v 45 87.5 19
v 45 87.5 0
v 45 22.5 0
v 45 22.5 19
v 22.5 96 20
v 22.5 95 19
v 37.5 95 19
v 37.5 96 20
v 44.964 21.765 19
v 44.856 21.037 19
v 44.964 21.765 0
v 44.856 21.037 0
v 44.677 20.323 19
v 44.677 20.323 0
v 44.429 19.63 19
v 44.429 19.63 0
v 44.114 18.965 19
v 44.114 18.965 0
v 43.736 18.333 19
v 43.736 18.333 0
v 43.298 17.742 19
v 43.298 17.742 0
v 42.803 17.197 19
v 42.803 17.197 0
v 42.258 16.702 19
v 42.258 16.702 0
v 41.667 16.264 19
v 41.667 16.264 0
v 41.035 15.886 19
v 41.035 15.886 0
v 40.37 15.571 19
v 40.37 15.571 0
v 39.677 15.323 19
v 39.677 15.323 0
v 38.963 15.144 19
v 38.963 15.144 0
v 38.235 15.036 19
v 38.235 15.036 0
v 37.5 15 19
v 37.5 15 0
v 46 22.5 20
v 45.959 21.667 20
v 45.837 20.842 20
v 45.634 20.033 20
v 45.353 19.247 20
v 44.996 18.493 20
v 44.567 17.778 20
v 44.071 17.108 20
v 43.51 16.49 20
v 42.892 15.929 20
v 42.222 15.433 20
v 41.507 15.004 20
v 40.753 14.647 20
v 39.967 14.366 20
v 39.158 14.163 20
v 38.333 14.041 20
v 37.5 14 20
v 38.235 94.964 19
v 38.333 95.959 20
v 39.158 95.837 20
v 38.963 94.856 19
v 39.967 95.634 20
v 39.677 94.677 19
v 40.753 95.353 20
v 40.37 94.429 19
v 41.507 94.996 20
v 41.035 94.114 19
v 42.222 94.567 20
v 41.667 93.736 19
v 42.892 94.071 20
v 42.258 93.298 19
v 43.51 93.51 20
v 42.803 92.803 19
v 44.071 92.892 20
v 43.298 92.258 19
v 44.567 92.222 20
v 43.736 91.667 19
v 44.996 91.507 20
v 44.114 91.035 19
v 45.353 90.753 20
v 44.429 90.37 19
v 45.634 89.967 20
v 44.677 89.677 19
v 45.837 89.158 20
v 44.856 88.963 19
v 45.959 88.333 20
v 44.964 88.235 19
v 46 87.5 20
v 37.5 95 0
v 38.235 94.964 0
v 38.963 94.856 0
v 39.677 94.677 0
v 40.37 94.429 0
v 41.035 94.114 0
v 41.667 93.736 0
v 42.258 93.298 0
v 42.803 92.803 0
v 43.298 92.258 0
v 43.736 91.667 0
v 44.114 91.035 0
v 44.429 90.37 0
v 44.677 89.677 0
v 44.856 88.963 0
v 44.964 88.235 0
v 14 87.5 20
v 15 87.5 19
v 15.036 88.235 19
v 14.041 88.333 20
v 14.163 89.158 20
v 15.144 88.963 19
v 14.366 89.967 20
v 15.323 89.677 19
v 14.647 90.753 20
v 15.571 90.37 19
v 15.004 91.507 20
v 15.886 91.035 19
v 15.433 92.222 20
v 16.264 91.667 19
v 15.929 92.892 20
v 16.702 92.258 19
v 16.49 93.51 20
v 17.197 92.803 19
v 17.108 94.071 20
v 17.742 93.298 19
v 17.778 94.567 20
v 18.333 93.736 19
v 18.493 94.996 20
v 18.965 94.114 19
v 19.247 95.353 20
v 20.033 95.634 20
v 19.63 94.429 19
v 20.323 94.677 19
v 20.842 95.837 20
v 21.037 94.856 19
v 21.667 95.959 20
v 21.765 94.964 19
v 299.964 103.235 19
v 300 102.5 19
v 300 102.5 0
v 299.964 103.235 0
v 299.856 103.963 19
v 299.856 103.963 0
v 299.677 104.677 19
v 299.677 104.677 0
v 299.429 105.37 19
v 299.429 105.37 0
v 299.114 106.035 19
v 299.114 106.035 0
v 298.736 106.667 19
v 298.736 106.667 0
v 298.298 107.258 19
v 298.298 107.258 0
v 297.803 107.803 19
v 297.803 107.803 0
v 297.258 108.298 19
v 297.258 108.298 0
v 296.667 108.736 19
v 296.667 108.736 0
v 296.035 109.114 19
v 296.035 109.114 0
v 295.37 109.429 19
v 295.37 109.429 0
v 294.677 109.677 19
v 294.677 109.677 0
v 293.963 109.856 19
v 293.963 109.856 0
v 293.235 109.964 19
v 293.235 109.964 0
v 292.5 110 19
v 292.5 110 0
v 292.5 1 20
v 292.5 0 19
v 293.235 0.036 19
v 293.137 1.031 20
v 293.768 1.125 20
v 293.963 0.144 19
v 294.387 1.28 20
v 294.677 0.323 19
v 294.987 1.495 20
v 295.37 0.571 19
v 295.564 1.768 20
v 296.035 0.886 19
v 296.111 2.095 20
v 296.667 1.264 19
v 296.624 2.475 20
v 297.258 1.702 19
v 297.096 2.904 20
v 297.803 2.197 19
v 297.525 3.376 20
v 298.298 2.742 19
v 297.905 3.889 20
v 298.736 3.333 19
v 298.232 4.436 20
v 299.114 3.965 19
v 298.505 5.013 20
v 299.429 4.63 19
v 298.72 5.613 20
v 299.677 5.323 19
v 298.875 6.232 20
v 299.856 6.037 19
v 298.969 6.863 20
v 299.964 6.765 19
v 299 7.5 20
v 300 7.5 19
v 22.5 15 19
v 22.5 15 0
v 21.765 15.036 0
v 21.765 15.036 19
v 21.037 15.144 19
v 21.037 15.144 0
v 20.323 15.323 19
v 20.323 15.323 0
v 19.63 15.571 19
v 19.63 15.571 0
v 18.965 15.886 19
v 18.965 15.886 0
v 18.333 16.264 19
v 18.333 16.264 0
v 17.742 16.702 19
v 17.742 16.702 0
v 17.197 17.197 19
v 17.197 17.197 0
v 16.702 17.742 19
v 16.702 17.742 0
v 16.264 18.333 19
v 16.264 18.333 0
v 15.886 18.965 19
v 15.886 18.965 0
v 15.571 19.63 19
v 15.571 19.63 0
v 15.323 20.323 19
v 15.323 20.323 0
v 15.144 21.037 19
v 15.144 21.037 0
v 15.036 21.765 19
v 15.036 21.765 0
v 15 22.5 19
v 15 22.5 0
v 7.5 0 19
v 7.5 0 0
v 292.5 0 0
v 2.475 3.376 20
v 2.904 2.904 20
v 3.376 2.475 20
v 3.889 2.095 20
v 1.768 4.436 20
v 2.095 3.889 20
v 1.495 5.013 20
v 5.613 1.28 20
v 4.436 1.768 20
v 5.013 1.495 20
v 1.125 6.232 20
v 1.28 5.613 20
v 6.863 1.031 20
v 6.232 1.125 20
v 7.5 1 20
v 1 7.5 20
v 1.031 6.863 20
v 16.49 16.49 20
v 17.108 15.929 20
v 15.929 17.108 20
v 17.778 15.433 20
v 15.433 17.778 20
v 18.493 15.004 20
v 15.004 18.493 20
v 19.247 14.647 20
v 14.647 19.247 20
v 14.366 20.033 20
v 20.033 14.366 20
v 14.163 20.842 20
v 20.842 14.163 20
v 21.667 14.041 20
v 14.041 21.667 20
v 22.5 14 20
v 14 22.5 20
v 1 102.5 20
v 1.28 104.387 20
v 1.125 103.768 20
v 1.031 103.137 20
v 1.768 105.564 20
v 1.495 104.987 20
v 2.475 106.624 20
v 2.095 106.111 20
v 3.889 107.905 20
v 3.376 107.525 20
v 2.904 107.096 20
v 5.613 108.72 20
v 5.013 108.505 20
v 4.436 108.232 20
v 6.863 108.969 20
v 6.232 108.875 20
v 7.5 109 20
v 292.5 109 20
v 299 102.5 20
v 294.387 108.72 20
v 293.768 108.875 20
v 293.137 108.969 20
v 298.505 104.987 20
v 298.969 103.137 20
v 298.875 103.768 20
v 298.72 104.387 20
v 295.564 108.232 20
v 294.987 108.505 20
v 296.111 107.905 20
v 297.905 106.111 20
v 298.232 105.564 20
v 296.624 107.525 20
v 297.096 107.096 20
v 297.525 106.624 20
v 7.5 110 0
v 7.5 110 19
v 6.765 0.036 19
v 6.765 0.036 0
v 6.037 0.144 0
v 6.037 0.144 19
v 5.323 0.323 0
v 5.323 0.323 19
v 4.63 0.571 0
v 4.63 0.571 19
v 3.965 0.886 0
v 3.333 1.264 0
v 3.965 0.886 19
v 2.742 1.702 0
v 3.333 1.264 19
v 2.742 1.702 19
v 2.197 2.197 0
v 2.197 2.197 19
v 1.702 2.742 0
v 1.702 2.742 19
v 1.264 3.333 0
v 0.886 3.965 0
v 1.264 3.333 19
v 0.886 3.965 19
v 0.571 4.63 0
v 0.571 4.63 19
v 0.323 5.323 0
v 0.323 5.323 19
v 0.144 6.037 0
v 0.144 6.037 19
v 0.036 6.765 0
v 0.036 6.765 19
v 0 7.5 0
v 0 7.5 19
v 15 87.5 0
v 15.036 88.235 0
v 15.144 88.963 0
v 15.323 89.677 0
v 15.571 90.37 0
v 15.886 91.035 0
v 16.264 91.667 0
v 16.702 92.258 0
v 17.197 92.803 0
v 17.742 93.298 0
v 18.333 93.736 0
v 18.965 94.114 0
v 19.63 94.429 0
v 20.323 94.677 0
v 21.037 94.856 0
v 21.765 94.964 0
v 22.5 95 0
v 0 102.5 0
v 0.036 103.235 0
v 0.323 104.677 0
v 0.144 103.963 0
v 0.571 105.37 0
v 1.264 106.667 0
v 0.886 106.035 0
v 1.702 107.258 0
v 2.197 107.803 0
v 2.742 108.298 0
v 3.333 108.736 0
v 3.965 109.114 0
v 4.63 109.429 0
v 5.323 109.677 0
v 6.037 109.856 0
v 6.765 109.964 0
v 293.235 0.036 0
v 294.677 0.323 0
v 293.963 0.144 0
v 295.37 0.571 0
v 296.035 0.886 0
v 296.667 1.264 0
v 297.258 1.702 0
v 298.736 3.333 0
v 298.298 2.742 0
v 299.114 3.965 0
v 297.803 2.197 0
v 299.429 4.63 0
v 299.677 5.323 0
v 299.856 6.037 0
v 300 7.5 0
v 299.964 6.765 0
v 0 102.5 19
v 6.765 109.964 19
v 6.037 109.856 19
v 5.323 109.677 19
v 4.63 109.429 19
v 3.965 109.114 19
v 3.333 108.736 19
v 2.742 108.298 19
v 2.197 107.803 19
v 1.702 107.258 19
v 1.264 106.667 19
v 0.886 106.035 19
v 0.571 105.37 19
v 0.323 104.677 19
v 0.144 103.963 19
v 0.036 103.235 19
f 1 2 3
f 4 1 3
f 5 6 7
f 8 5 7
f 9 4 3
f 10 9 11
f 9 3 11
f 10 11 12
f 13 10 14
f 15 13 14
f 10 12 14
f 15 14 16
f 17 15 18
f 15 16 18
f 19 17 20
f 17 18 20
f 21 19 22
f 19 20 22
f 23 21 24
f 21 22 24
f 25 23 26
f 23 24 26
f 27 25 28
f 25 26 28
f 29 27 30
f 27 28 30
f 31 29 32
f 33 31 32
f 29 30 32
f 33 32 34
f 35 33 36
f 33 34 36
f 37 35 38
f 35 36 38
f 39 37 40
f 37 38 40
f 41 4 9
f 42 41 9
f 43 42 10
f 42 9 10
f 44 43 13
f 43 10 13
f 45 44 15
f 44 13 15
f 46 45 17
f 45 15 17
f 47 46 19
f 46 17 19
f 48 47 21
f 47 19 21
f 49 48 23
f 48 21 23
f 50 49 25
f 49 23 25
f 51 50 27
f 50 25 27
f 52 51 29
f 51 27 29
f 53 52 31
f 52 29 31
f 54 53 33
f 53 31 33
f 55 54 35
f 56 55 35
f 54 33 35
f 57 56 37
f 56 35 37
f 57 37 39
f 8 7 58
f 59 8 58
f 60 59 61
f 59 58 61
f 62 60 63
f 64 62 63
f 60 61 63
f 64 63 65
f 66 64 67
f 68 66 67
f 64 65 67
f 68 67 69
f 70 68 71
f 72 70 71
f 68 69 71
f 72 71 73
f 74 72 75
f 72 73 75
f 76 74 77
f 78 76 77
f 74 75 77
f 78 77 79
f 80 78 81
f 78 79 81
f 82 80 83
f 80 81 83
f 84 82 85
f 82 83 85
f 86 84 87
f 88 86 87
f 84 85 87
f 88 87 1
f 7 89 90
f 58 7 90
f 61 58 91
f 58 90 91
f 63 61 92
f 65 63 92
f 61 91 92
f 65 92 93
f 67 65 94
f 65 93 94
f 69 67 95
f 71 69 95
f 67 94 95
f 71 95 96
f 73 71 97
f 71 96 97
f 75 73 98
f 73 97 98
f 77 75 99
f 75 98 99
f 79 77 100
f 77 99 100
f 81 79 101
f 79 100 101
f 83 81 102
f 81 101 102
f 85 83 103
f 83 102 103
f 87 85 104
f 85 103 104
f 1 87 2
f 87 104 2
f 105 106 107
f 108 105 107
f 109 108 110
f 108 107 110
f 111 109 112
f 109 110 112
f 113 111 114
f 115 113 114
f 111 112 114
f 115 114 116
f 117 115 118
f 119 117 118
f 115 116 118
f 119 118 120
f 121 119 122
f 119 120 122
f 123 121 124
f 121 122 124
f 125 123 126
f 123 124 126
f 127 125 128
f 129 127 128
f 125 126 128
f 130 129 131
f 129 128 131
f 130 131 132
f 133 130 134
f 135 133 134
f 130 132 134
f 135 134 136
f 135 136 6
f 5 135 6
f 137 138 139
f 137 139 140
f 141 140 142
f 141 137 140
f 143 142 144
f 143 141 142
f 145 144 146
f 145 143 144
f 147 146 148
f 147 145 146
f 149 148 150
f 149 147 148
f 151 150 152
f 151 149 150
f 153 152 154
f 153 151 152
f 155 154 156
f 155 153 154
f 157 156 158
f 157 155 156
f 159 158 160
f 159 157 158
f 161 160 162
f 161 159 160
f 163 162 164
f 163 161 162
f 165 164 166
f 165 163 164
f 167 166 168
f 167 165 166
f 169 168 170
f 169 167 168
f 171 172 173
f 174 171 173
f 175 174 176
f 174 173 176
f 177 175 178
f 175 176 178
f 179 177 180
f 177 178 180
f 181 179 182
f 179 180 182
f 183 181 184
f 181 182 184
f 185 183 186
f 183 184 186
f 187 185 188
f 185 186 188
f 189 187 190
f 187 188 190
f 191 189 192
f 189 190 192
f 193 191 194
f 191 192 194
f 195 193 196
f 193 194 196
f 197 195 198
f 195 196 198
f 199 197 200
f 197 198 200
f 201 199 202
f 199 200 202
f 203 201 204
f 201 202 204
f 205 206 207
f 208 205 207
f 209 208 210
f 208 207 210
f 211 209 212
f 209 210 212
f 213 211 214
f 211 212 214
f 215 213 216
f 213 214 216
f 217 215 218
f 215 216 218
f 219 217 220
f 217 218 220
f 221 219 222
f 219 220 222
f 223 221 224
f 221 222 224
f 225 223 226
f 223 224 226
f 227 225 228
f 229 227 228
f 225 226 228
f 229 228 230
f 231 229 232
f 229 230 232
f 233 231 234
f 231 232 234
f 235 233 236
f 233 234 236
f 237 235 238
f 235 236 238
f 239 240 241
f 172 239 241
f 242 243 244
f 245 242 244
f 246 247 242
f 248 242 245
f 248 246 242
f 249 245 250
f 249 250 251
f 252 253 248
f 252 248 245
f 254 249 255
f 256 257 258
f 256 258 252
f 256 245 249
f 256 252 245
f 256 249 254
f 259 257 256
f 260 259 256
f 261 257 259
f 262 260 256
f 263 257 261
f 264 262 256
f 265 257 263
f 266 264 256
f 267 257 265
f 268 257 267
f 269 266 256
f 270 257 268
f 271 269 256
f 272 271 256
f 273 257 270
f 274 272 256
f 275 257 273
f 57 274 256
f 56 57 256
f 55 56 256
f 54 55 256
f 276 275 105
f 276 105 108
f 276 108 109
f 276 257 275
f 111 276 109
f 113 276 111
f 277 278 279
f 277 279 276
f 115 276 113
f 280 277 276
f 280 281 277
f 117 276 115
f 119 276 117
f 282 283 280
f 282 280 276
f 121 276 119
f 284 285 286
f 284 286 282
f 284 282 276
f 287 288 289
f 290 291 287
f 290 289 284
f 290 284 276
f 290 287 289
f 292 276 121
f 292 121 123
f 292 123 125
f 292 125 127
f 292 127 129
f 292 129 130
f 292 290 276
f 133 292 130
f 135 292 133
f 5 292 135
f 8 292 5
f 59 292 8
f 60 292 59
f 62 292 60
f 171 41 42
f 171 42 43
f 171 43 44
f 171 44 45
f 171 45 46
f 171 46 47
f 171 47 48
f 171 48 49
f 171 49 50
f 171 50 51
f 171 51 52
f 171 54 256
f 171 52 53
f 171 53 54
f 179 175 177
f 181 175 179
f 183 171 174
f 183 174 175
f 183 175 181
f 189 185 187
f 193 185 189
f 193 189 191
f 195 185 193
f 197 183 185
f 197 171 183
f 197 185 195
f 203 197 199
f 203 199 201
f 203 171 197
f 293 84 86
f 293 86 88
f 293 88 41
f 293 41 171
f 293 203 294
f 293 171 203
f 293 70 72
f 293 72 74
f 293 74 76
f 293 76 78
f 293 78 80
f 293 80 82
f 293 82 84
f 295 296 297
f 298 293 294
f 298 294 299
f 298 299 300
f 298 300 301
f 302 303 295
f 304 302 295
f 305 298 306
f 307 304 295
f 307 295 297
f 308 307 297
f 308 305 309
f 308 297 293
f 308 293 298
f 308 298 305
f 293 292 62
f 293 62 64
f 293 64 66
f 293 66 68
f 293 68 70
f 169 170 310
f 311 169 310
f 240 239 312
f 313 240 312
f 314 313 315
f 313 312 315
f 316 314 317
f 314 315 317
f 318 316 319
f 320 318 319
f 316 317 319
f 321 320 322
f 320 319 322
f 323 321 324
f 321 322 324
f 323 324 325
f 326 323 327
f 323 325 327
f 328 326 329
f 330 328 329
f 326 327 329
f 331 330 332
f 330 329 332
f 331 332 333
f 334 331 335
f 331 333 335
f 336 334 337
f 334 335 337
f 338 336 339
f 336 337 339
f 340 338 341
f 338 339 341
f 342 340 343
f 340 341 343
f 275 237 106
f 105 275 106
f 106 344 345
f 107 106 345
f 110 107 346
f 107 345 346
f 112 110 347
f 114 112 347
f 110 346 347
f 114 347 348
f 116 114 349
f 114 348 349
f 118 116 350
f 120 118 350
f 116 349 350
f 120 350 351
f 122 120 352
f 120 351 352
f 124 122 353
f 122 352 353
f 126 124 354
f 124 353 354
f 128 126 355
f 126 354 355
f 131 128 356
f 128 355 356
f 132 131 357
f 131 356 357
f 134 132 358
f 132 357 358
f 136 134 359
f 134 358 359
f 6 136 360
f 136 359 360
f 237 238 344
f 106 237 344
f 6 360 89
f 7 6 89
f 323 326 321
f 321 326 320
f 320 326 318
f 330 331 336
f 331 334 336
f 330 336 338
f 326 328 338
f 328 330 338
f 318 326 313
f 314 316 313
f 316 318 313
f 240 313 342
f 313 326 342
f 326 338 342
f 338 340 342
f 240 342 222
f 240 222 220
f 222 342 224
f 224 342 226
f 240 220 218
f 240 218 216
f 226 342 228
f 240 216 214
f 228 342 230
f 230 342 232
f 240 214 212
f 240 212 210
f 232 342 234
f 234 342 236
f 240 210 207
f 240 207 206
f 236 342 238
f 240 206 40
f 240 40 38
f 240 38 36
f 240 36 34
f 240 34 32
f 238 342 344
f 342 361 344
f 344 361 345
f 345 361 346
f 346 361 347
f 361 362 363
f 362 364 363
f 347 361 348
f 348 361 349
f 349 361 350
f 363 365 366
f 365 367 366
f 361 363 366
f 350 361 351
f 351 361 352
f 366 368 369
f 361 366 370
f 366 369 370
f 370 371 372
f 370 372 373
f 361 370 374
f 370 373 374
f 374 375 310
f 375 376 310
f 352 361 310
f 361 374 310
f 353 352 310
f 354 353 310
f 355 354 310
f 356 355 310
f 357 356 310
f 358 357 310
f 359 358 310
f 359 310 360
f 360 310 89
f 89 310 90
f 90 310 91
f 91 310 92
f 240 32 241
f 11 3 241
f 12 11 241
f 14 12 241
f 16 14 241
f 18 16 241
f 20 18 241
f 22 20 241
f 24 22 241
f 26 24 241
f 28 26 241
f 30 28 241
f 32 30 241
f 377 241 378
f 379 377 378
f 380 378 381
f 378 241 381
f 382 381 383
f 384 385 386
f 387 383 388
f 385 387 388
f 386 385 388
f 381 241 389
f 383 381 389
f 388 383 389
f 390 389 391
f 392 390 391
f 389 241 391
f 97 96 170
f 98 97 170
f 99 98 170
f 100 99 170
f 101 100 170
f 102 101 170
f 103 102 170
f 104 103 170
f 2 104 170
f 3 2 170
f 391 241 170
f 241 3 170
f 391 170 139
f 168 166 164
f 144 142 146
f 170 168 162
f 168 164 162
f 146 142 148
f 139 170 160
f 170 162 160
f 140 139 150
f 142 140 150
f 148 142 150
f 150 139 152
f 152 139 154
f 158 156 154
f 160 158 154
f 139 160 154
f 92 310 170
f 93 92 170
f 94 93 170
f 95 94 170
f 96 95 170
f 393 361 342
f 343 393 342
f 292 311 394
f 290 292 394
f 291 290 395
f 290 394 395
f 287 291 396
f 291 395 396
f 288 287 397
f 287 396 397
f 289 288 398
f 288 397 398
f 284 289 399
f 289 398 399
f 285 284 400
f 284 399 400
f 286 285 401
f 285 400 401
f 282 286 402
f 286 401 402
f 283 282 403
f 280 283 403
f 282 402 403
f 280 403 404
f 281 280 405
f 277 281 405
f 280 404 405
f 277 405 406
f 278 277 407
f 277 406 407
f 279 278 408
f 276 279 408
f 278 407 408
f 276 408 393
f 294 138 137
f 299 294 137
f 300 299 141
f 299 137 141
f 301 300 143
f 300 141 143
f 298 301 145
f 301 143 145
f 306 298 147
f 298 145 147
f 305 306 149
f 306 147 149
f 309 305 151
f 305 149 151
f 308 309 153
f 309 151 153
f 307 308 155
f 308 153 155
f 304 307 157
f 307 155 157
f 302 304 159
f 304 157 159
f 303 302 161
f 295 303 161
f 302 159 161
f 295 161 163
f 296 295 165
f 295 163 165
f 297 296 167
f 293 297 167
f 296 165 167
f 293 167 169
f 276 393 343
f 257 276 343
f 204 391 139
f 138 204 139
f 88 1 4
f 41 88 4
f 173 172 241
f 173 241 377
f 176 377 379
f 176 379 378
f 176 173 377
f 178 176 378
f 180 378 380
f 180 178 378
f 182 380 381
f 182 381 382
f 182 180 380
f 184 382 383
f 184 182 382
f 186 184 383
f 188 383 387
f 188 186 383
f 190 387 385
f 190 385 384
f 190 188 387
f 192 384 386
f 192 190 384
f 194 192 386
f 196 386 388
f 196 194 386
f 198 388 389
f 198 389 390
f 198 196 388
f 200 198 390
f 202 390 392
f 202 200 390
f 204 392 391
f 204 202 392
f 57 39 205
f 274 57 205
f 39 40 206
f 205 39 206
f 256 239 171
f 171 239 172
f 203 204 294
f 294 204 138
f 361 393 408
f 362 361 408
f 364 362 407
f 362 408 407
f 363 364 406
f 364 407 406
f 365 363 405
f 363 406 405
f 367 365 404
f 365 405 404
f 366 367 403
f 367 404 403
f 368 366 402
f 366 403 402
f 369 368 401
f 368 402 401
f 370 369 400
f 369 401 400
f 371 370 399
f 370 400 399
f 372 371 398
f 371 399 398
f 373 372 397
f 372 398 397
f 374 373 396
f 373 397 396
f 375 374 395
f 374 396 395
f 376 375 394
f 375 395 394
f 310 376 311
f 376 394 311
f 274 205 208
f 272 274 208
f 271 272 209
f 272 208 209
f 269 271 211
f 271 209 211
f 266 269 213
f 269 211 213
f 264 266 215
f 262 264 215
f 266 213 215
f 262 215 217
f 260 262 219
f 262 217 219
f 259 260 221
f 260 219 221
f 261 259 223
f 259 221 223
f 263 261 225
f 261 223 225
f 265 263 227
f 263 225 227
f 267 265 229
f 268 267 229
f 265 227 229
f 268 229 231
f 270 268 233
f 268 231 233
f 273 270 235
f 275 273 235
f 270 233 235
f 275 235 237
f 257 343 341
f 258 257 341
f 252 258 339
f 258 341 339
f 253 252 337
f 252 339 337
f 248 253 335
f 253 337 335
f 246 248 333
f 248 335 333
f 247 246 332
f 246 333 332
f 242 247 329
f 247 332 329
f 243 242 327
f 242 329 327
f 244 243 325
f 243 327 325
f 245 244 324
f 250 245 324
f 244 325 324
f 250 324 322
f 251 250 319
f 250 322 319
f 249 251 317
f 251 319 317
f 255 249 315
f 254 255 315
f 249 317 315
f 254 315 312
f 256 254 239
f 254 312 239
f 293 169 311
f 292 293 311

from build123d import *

# Parameters (mm, degrees)
F1_DEPTH = 20
F2_R     = 7.5
F3_SIZE  = 1


with BuildPart() as f1:
    # F0 (on Top) → F1 (new body)
    with BuildSketch(Plane.XY):
        Polygon((0, 55), (0, 0), (300, 0), (300, 110), (0, 110), align=None)
        with BuildLine():
            Line((15, 22.5), (15, 55))
            Line((15, 55), (15, 87.5))
            ThreePointArc((15, 87.5), (17.196699, 92.803301), (22.5, 95))
            Line((22.5, 95), (37.5, 95))
            ThreePointArc((37.5, 95), (42.803301, 92.803301), (45, 87.5))
            Line((45, 87.5), (45, 22.5))
            ThreePointArc((45, 22.5), (42.803301, 17.196699), (37.5, 15))
            Line((37.5, 15), (22.5, 15))
            ThreePointArc((22.5, 15), (17.196699, 17.196699), (15, 22.5))
        make_face(mode=Mode.SUBTRACT)
    extrude(amount=F1_DEPTH)

    # F2
    f2_edges = [f1.edges().sort_by_distance(p)[0] for p in [
        (300, 0, 10),
        (300, 110, 10),
        (0, 0, 10),
        (0, 110, 10),
    ]]
    fillet(f2_edges, radius=F2_R)

    # F3
    f3_edges = [f1.edges().sort_by_distance(p)[0] for p in [
        (0, 55, 20),
        (2.196699, 2.196699, 20),
        (2.196699, 107.803301, 20),
        (150, 0, 20),
        (150, 110, 20),
        (297.803301, 2.196699, 20),
        (297.803301, 107.803301, 20),
        (300, 55, 20),
        (15, 55, 20),
        (17.196699, 92.803301, 20),
        (30, 95, 20),
        (42.803301, 92.803301, 20),
        (45, 55, 20),
        (42.803301, 17.196699, 20),
        (30, 15, 20),
        (17.196699, 17.196699, 20),
    ]]
    chamfer(f3_edges, length=F3_SIZE)


solid = f1.part
